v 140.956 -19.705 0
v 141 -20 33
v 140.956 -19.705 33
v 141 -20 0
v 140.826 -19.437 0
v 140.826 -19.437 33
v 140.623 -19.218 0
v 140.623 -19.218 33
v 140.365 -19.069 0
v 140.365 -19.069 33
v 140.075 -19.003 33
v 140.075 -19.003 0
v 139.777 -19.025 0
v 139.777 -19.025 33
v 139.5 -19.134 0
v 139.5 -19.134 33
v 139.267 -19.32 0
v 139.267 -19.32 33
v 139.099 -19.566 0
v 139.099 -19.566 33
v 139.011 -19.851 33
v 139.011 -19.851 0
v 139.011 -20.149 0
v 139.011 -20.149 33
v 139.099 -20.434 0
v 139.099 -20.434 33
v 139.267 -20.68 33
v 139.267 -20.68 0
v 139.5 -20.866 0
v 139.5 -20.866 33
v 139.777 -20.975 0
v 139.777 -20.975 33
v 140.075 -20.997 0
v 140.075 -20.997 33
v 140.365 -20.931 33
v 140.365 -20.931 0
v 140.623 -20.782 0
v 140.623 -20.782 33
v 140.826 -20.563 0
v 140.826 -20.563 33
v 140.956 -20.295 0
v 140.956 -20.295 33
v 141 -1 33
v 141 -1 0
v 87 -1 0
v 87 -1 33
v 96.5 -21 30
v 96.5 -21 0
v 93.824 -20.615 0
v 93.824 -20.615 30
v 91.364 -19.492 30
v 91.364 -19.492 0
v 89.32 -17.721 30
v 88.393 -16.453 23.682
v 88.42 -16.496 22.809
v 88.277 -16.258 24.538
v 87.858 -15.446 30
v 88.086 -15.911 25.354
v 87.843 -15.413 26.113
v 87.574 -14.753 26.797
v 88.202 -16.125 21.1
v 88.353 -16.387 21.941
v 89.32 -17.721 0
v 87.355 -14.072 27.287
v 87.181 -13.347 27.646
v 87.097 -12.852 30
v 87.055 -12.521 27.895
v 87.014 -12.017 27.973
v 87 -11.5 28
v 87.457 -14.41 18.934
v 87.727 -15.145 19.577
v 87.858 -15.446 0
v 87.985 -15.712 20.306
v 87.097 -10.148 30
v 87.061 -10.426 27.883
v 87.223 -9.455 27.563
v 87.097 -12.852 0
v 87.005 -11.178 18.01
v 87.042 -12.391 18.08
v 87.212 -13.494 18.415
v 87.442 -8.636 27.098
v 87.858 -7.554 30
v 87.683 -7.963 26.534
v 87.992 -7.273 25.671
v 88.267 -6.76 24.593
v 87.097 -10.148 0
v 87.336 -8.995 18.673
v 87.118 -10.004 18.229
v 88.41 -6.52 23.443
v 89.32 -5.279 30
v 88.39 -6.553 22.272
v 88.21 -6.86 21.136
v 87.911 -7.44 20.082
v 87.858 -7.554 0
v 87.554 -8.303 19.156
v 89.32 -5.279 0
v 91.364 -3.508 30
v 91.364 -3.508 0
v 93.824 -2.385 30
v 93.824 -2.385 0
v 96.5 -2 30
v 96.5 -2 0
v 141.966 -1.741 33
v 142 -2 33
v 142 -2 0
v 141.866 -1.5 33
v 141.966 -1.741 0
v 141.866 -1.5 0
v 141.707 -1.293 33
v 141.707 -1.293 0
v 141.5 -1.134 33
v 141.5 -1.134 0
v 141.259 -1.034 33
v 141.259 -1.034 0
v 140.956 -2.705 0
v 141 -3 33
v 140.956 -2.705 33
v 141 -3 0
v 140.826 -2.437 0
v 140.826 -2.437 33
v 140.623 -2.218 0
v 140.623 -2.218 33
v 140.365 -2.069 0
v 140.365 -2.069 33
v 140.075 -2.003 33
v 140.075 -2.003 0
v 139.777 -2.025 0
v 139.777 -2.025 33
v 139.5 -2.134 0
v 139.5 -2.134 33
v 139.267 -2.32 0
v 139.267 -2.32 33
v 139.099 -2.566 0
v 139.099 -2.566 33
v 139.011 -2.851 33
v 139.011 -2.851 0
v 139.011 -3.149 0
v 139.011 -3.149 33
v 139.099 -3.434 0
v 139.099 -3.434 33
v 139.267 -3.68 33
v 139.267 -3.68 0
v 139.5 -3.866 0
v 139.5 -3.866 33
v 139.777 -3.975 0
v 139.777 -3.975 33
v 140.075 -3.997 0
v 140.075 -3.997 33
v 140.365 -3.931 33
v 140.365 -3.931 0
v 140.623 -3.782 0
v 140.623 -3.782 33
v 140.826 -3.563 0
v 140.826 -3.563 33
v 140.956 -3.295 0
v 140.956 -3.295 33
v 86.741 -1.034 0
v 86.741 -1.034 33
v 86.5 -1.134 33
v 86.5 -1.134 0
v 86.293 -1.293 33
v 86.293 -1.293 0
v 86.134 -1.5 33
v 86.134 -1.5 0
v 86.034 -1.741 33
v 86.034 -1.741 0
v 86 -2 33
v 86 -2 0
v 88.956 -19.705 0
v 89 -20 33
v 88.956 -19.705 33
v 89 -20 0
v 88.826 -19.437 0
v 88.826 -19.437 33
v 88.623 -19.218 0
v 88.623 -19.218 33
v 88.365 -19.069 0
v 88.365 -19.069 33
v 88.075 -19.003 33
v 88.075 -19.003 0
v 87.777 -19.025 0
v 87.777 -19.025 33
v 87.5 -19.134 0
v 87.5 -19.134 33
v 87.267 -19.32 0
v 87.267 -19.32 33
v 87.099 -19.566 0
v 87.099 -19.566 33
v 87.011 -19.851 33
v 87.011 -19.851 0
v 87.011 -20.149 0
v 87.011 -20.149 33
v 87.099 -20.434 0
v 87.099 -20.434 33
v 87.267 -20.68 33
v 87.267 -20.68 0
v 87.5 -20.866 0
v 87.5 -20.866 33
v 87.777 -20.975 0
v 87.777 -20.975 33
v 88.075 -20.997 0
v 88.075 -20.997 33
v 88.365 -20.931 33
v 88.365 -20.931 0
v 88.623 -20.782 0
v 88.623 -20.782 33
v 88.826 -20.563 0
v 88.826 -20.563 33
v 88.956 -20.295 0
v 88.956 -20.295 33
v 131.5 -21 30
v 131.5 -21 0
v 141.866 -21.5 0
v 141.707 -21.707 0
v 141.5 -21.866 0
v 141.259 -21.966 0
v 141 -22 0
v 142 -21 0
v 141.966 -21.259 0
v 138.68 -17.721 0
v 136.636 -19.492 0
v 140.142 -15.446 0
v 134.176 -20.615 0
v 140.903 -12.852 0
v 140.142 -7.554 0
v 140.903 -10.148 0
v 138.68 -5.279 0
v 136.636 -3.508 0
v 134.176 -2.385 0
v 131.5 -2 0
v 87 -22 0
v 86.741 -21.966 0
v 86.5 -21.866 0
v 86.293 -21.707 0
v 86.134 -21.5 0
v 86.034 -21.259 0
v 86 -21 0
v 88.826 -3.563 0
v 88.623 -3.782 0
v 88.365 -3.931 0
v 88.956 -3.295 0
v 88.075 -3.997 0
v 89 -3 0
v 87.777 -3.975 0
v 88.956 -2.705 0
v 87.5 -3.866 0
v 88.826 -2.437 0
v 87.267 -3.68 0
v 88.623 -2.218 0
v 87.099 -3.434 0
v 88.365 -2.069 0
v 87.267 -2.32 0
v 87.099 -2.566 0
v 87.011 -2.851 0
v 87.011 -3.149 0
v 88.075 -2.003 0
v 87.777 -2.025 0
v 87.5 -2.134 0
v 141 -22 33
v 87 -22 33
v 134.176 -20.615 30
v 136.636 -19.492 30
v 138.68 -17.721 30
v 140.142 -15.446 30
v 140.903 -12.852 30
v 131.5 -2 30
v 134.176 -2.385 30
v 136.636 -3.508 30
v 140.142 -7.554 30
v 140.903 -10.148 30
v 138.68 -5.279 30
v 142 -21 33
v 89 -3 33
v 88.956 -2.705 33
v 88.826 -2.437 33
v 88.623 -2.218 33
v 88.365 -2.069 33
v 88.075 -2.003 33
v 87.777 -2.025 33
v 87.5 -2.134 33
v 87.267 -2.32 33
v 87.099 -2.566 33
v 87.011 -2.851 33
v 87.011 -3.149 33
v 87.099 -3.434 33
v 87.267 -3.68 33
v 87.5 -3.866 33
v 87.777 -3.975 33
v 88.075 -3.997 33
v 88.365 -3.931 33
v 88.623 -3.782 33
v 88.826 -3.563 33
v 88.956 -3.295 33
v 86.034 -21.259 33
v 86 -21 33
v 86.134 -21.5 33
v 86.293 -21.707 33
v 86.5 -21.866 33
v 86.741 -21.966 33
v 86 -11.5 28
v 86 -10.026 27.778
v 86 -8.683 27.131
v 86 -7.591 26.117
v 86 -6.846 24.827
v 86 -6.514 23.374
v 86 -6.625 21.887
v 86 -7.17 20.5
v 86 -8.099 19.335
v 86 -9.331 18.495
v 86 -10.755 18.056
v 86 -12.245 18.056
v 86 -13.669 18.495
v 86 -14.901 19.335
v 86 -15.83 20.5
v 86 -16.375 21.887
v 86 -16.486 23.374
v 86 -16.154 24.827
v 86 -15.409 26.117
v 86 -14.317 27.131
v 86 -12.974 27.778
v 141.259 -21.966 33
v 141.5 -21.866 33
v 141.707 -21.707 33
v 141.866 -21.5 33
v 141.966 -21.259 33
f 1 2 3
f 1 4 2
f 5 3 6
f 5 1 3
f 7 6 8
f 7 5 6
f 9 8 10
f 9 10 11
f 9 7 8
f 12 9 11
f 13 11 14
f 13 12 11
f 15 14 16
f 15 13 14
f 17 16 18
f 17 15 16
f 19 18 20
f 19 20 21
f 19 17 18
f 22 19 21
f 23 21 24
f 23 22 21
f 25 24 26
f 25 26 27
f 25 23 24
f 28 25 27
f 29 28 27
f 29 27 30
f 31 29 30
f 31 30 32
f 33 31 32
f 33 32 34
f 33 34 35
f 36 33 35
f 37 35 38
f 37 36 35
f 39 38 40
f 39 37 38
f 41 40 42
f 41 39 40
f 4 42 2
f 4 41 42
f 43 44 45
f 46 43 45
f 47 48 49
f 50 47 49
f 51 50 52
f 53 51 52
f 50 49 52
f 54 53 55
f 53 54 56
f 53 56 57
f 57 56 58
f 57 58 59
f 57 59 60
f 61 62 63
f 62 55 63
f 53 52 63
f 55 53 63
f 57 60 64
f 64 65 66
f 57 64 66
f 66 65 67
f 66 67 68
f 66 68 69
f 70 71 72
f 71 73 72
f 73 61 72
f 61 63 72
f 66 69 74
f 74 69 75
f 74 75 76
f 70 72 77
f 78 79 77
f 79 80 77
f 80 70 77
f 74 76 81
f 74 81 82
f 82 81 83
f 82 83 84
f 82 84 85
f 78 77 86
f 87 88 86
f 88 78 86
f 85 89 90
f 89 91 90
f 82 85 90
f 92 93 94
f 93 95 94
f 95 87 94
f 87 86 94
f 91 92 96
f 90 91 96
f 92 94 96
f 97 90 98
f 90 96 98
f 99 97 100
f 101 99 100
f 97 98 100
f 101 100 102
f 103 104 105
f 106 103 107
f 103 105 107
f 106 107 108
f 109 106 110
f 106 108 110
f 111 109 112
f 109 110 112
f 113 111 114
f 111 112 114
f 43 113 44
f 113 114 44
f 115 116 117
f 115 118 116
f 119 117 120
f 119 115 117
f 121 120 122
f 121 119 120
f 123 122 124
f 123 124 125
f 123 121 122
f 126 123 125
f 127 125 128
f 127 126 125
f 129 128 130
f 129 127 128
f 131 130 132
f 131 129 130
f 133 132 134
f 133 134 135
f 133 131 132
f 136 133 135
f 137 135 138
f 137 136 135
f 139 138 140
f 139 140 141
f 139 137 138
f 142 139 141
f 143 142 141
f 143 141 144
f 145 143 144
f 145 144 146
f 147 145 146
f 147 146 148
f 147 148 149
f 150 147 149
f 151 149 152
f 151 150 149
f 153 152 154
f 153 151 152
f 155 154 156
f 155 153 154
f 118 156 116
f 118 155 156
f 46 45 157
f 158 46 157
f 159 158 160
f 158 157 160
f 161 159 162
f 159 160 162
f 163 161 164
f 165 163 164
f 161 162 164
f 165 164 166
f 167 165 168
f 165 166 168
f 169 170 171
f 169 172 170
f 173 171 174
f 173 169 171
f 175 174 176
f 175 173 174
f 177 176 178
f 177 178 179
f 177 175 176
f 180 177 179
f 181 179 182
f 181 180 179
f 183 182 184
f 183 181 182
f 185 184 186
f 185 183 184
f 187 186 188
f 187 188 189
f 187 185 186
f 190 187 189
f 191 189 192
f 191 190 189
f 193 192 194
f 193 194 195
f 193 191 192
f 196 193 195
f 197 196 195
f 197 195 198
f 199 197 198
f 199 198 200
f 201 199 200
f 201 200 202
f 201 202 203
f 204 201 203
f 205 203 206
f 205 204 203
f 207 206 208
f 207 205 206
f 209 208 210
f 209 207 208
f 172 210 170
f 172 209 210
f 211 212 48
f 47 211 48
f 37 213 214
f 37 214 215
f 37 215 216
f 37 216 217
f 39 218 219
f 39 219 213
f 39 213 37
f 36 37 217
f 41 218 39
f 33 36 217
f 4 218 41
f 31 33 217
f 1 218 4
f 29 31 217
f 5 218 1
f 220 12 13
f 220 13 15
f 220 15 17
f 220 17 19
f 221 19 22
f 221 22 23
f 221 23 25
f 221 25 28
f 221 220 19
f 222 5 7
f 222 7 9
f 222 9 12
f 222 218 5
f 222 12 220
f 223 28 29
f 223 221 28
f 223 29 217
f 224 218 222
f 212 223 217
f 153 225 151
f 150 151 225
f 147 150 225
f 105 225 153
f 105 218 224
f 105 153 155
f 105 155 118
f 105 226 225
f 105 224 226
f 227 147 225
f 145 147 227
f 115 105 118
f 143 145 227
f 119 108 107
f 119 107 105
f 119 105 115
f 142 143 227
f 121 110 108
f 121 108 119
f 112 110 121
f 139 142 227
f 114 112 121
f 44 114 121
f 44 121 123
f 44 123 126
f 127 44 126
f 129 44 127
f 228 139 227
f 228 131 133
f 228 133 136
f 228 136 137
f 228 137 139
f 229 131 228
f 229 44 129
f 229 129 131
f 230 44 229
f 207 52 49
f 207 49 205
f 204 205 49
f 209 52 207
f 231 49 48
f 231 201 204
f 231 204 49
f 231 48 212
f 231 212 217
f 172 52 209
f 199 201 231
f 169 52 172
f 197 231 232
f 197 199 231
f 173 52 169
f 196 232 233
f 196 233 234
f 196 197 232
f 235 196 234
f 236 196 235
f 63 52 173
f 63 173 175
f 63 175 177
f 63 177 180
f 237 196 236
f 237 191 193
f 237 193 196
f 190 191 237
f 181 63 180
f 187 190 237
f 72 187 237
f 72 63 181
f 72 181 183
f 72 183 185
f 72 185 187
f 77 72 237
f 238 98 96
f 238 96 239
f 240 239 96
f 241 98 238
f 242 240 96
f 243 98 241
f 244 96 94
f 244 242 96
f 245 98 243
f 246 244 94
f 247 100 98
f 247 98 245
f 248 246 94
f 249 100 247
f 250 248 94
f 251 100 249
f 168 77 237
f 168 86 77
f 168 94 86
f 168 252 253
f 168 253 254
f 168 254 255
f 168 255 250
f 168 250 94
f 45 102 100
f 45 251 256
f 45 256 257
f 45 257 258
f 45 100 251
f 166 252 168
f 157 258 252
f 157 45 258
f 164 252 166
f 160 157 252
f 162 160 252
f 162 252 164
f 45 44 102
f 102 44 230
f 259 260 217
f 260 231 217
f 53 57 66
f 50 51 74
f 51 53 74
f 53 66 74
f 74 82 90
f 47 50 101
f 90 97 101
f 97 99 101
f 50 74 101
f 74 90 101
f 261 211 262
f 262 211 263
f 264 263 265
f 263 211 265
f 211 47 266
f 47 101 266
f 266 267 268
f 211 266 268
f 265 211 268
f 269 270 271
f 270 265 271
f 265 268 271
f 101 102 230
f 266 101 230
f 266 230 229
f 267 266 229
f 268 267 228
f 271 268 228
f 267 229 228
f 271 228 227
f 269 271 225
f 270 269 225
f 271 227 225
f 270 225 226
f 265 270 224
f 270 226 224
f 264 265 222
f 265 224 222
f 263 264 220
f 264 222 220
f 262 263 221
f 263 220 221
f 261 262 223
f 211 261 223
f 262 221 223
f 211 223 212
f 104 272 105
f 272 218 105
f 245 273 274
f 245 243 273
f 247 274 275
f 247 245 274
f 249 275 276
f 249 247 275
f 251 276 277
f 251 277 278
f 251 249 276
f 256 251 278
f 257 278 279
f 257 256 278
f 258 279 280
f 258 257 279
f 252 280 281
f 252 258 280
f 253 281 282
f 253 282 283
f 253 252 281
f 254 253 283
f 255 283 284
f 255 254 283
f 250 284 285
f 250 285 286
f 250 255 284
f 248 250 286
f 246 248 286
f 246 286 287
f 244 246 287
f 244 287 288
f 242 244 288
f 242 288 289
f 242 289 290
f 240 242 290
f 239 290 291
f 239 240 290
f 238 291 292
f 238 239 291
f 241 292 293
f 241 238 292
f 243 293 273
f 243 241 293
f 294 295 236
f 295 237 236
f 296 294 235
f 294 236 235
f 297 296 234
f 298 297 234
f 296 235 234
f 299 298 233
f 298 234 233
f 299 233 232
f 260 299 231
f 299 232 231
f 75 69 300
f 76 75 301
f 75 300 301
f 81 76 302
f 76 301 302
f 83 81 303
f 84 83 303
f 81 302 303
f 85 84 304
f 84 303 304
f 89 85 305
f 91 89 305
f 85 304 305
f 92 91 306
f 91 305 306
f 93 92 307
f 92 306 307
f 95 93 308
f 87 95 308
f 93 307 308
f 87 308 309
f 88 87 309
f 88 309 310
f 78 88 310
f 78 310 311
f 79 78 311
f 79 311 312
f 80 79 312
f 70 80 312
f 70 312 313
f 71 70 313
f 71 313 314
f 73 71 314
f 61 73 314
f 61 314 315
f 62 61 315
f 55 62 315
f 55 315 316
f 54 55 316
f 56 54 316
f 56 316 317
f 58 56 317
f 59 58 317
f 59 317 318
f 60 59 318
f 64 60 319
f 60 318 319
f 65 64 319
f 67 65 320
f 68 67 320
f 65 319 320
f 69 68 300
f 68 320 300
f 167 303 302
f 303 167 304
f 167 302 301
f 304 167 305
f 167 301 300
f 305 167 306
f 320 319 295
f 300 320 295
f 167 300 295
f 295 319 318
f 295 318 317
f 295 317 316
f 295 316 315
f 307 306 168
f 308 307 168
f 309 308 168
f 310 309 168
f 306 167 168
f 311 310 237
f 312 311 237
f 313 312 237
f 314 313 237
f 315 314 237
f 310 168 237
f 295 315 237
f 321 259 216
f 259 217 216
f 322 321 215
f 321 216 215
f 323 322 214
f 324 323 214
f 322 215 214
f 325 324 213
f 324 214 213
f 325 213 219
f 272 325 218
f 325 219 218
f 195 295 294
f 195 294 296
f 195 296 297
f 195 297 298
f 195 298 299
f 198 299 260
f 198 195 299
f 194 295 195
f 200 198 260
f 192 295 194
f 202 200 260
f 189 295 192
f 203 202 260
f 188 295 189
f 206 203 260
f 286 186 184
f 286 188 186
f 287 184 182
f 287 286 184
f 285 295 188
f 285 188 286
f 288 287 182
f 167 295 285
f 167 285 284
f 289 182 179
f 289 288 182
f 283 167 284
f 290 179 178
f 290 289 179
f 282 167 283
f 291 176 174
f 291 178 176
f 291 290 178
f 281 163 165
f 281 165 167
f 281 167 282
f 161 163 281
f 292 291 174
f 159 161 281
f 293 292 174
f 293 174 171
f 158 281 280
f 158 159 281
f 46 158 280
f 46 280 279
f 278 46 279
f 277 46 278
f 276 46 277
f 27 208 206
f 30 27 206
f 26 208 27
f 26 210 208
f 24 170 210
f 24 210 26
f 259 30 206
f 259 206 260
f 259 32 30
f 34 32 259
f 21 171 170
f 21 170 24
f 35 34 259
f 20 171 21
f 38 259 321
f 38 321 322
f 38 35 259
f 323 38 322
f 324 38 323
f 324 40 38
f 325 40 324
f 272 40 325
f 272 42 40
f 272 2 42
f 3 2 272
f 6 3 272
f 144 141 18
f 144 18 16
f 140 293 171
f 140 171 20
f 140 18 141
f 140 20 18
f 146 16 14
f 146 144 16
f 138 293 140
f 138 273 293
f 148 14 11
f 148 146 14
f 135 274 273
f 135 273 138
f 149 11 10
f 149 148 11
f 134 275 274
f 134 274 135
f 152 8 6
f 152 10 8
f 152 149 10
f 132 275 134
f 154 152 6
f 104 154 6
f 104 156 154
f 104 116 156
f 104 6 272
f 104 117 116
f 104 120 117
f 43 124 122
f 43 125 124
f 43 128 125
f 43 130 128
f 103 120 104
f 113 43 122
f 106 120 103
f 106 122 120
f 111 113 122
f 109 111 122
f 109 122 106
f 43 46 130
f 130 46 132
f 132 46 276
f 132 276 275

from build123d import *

# Parameters (mm, degrees)
SKETCH1_R               = 1
BOSS_EXTRUDE1_DEPTH     = 30
SKETCH3_R               = 1
BOSS_EXTRUDE2_DEPTH     = 3
CUT_EXTRUDE1_REACH      = 70.622
CUT_EXTRUDE1_END_RADIUS = 9.5
SKETCH4_R               = 5


with BuildPart() as part:
    # Sketch1 → Boss-Extrude1 (new body)
    with BuildSketch(Plane.XY):
        with BuildLine():
            Line((141, -22), (87, -22))
            ThreePointArc((87, -22), (86.292893219, -21.707106781), (86, -21))
            Line((86, -21), (86, -2))
            ThreePointArc((86, -2), (86.292893219, -1.292893219), (87, -1))
            Line((87, -1), (141, -1))
            ThreePointArc((141, -1), (141.707106781, -1.292893219), (142, -2))
            Line((142, -2), (142, -21))
            ThreePointArc((142, -21), (141.707106781, -21.707106781), (141, -22))
        make_face()
        with Locations((140, -3)):
            Circle(SKETCH1_R, mode=Mode.SUBTRACT)
        with Locations((88, -3)):
            Circle(SKETCH1_R, mode=Mode.SUBTRACT)
        with Locations((88, -20)):
            Circle(SKETCH1_R, mode=Mode.SUBTRACT)
        with Locations((140, -20)):
            Circle(SKETCH1_R, mode=Mode.SUBTRACT)
        with BuildLine():
            Line((131.5, -21), (96.5, -21))
            ThreePointArc((96.5, -21), (87, -11.5), (96.5, -2))
            Line((96.5, -2), (131.5, -2))
            ThreePointArc((131.5, -2), (141, -11.5), (131.5, -21))
        make_face(mode=Mode.SUBTRACT)
    extrude(amount=BOSS_EXTRUDE1_DEPTH)

    # Sketch3 → Boss-Extrude2 (add)
    with BuildSketch(Plane.XY.offset(30)):
        with BuildLine():
            Line((86, -2), (86, -21))
            ThreePointArc((86, -21), (86.292893219, -21.707106781), (87, -22))
            Line((87, -22), (141, -22))
            ThreePointArc((141, -22), (141.707106781, -21.707106781), (142, -21))
            Line((142, -21), (142, -2))
            ThreePointArc((142, -2), (141.707106781, -1.292893219), (141, -1))
            Line((141, -1), (87, -1))
            ThreePointArc((87, -1), (86.292893219, -1.292893219), (86, -2))
        make_face()
        with Locations((88, -3)):
            Circle(SKETCH3_R, mode=Mode.SUBTRACT)
        with Locations((88, -20)):
            Circle(SKETCH3_R, mode=Mode.SUBTRACT)
        with Locations((140, -20)):
            Circle(SKETCH3_R, mode=Mode.SUBTRACT)
        with Locations((140, -3)):
            Circle(SKETCH3_R, mode=Mode.SUBTRACT)
    extrude(amount=BOSS_EXTRUDE2_DEPTH)

    # Cut-Extrude1: up to this cylinder (the profile starts outside it)
    cut_extrude1_end = Plane(origin=(96.5, -11.5, 23), z_dir=(0, 0, -1)) * Cylinder(CUT_EXTRUDE1_END_RADIUS, 161.244, mode=Mode.PRIVATE)
    # Sketch4 → Cut-Extrude1 (cut, up to the surface)
    with BuildSketch(Plane.ZY.offset(-86), mode=Mode.PRIVATE) as cut_extrude1_sk1:
        with Locations((23, -11.5)):
            Circle(SKETCH4_R)
    cut_extrude1_tool1 = extrude(cut_extrude1_sk1.sketch, amount=-CUT_EXTRUDE1_REACH, mode=Mode.PRIVATE) - cut_extrude1_end
    add(cut_extrude1_tool1.solids().sort_by_distance((86, -11.5, 23))[0], mode=Mode.SUBTRACT)


solid = part.part
